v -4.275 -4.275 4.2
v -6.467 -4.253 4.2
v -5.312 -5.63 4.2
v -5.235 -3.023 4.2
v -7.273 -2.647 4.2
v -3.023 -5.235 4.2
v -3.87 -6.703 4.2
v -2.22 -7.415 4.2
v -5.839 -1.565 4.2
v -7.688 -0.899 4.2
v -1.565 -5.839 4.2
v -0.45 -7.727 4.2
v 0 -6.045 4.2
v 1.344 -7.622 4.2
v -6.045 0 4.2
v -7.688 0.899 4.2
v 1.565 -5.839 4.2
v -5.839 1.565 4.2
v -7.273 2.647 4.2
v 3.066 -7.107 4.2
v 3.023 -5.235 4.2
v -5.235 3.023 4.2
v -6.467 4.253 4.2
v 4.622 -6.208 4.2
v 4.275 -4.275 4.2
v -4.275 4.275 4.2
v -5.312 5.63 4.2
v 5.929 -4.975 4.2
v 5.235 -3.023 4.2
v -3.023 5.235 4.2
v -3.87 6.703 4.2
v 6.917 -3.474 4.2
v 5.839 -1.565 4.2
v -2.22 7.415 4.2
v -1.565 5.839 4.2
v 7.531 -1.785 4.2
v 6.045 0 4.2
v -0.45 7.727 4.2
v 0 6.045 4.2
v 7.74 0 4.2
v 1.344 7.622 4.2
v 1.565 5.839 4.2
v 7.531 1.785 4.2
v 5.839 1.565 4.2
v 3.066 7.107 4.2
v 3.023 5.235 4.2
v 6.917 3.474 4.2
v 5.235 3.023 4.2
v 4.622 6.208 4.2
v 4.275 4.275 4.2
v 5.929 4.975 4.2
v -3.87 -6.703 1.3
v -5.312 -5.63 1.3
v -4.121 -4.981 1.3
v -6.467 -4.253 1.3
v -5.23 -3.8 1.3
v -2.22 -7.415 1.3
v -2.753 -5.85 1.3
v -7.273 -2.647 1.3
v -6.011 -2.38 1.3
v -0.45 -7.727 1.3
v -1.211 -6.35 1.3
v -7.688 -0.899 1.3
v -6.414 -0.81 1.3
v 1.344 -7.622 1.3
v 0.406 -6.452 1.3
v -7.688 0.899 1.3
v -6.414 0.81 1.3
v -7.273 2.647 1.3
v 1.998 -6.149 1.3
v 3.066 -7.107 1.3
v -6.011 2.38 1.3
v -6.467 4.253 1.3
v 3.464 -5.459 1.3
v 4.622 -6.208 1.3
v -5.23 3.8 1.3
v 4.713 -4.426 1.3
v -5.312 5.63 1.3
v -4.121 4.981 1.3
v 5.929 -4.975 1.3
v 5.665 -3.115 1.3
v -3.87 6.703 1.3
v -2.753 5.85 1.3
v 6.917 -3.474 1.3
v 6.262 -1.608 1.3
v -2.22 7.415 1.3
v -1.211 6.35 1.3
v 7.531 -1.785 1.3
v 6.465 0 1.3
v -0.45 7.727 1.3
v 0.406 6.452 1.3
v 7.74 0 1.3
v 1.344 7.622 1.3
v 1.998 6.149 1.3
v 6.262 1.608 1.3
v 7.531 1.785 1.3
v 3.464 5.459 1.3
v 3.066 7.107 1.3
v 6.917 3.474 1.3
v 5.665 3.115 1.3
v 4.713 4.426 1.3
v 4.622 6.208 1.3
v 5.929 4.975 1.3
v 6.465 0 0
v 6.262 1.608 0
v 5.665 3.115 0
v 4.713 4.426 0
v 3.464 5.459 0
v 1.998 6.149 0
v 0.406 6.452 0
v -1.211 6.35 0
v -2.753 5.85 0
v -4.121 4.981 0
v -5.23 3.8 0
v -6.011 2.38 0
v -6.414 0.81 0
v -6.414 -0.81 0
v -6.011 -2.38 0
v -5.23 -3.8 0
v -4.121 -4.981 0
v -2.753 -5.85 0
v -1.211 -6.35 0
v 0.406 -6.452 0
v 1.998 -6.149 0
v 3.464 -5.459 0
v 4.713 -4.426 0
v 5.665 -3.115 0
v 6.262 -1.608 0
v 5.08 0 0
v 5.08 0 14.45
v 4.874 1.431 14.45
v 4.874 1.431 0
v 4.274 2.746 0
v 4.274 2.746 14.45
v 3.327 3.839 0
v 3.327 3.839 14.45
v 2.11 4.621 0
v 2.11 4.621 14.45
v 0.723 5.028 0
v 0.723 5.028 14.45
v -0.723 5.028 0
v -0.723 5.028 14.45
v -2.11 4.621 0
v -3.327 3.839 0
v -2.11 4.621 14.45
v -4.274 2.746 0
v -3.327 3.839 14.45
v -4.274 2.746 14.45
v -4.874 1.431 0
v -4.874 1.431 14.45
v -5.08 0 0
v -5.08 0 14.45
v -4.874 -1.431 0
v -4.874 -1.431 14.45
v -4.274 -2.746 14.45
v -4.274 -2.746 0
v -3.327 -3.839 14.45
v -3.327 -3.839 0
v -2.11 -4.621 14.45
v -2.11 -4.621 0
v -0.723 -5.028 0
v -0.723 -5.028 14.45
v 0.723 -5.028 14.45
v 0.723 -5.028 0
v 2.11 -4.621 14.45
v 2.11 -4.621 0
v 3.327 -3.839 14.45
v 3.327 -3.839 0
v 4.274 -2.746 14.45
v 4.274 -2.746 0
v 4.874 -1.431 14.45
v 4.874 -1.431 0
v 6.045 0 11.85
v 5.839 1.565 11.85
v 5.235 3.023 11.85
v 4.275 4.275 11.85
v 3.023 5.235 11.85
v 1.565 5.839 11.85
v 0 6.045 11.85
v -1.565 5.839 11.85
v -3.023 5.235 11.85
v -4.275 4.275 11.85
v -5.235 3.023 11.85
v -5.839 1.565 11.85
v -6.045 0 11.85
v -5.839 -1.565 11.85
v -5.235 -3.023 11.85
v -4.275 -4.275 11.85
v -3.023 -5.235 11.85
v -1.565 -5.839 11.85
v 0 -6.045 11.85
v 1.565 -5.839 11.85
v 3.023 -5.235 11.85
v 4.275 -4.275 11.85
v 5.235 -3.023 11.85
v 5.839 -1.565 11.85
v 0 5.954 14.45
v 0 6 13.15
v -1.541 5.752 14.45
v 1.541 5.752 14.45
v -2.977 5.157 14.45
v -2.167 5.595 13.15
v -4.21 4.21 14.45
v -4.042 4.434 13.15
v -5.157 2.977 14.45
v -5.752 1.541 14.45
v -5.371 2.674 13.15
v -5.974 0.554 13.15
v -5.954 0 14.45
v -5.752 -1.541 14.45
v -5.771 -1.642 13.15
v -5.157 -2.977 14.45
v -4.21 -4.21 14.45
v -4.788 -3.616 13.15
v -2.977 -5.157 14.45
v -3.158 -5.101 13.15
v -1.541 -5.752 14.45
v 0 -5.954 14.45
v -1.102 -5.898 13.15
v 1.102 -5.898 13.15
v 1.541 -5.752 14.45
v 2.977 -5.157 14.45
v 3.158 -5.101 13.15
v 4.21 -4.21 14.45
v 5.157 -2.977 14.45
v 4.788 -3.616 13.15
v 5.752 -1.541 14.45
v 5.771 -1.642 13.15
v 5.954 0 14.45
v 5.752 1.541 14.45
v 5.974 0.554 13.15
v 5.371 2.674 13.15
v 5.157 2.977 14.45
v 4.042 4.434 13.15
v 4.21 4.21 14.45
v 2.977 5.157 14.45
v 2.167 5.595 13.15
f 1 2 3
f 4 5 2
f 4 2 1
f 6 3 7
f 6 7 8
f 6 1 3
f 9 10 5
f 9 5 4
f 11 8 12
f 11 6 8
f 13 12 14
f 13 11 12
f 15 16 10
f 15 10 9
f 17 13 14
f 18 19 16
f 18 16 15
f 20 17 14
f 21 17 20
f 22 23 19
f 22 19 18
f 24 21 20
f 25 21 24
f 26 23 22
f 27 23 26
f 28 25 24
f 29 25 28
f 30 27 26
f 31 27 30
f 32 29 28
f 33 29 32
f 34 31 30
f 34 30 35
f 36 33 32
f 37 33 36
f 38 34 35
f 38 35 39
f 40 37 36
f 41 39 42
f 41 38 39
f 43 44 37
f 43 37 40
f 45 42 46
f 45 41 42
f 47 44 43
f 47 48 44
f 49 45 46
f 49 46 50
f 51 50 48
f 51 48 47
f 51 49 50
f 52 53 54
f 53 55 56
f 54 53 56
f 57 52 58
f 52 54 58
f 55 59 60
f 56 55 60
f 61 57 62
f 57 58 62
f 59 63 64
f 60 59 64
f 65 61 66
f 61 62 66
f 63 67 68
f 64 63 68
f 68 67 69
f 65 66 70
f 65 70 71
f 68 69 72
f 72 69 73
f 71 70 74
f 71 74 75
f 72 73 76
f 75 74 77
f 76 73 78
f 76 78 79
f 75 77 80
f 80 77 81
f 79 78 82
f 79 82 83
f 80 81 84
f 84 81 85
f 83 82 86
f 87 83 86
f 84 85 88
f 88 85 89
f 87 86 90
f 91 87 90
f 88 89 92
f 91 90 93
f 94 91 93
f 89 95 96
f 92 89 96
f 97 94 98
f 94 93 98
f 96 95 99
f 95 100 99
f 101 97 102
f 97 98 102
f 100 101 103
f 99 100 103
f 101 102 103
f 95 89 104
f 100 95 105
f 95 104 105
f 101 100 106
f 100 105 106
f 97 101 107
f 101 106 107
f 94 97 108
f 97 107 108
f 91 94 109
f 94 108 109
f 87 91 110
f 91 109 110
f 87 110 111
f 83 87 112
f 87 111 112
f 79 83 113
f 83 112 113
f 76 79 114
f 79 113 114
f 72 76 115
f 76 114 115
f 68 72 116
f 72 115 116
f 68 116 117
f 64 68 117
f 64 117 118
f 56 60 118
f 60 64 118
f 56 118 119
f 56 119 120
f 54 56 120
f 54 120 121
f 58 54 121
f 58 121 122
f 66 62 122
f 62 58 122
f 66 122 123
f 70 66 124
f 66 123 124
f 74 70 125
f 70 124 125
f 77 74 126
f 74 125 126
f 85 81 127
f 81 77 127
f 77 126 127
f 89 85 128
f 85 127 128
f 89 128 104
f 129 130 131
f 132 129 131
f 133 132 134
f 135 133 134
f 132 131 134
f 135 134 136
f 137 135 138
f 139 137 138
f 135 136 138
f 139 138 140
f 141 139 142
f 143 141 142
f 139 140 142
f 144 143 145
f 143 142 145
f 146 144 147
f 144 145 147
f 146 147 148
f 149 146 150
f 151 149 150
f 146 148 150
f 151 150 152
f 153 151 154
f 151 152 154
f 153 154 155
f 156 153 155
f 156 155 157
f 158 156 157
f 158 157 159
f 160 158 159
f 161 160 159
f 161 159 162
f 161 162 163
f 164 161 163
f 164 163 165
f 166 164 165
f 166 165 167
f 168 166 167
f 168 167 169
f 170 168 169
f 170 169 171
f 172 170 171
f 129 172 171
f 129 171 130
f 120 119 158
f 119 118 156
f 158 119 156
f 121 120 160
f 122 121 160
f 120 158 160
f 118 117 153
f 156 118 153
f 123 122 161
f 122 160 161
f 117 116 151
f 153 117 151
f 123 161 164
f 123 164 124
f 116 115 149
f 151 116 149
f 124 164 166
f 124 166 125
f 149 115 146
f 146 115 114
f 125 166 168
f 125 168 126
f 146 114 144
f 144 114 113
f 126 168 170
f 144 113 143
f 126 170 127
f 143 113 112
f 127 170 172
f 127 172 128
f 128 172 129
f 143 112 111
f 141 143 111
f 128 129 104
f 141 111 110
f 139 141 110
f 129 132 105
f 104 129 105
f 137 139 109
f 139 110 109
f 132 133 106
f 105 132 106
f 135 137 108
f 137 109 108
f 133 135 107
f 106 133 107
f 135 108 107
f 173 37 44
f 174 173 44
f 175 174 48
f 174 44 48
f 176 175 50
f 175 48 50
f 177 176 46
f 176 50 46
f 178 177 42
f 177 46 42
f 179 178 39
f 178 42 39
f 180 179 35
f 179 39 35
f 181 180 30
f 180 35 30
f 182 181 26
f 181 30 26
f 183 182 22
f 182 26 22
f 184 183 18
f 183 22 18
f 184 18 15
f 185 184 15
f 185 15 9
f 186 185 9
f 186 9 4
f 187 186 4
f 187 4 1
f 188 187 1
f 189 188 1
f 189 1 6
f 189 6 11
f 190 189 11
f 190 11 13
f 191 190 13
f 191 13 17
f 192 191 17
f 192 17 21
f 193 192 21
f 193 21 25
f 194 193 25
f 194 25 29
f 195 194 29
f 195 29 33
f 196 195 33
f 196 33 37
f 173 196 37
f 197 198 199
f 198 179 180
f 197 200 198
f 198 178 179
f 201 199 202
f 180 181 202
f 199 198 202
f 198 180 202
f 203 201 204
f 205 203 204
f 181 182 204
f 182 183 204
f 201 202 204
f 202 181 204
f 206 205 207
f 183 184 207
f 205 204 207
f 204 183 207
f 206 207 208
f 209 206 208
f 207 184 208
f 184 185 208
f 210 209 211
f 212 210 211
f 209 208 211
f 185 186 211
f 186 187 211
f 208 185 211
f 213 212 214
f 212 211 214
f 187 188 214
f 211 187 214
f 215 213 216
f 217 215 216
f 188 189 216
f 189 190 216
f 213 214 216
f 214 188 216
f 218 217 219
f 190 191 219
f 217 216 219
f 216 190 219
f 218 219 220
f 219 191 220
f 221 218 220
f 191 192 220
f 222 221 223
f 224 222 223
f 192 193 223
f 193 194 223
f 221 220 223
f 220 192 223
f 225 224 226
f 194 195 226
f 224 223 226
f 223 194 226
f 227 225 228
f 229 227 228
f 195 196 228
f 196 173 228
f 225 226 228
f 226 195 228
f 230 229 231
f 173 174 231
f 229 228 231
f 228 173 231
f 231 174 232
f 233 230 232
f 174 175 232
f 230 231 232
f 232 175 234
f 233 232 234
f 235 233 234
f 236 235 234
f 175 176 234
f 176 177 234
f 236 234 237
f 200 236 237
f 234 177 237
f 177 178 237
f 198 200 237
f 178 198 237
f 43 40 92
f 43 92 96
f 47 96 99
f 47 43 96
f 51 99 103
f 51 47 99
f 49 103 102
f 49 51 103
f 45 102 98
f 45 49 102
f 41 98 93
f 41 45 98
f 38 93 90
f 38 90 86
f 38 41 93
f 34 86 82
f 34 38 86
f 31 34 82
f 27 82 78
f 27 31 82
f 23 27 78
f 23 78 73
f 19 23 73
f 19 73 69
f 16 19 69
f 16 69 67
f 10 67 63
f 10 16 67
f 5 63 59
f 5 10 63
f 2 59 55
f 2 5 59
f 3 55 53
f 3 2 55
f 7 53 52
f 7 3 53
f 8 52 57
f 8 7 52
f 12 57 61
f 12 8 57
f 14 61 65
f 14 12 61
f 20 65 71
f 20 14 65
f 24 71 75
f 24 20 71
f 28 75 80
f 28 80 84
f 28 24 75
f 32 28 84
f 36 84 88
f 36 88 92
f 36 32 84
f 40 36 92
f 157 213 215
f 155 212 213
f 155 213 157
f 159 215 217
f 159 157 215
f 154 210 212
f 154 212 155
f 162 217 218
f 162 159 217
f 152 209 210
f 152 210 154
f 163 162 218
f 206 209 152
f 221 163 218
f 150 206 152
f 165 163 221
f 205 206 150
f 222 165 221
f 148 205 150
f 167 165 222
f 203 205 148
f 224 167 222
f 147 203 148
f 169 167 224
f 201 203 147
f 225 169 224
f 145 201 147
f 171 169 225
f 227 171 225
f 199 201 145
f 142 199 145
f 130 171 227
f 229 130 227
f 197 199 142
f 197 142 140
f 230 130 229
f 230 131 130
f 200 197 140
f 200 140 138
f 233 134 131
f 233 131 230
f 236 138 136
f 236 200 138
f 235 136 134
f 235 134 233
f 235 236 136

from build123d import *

# Parameters (mm, degrees)
SKETCH2_R           = 6.465
BOSS_EXTRUDE1_DEPTH = 4.2
SKETCH3_R           = 7.74
BOSS_EXTRUDE2_DEPTH = 2.9
SKETCH4_R           = 6.0452
BOSS_EXTRUDE3_DEPTH = 10.25
SKETCH5_R           = 5.08
CUT_EXTRUDE1_DEPTH  = 15.45


with BuildPart() as part:
    # Sketch2 → Boss-Extrude1 (new body)
    with BuildSketch(Plane.XY):
        Circle(SKETCH2_R)
    extrude(amount=BOSS_EXTRUDE1_DEPTH)

    # Sketch3 → Boss-Extrude2 (add)
    with BuildSketch(Plane.XY.offset(4.2)):
        Circle(SKETCH3_R)
    extrude(amount=-BOSS_EXTRUDE2_DEPTH)

    # Sketch4 → Boss-Extrude3 (add)
    with BuildSketch(Plane.XY.offset(4.2)):
        Circle(SKETCH4_R)
    extrude(amount=BOSS_EXTRUDE3_DEPTH)

    # Sketch5 → Cut-Extrude1 (cut, through all)
    with BuildSketch(Plane.XY.offset(14.45)):
        Circle(SKETCH5_R)
    extrude(amount=-CUT_EXTRUDE1_DEPTH, mode=Mode.SUBTRACT)

    # Sketch6 → Cut-Revolve1 (revolve, cut)
    with BuildSketch(Plane(origin=(0, 0, 0), x_dir=(0, 0, -1), z_dir=(1, 0, 0))):
        Polygon((-14.45, 5.954405999), (-11.85, 6.0452), (-14.45, 6.0452), align=None)
    revolve(axis=Axis((0, 0, 0), (0, 0, 1)), mode=Mode.SUBTRACT)


solid = part.part
